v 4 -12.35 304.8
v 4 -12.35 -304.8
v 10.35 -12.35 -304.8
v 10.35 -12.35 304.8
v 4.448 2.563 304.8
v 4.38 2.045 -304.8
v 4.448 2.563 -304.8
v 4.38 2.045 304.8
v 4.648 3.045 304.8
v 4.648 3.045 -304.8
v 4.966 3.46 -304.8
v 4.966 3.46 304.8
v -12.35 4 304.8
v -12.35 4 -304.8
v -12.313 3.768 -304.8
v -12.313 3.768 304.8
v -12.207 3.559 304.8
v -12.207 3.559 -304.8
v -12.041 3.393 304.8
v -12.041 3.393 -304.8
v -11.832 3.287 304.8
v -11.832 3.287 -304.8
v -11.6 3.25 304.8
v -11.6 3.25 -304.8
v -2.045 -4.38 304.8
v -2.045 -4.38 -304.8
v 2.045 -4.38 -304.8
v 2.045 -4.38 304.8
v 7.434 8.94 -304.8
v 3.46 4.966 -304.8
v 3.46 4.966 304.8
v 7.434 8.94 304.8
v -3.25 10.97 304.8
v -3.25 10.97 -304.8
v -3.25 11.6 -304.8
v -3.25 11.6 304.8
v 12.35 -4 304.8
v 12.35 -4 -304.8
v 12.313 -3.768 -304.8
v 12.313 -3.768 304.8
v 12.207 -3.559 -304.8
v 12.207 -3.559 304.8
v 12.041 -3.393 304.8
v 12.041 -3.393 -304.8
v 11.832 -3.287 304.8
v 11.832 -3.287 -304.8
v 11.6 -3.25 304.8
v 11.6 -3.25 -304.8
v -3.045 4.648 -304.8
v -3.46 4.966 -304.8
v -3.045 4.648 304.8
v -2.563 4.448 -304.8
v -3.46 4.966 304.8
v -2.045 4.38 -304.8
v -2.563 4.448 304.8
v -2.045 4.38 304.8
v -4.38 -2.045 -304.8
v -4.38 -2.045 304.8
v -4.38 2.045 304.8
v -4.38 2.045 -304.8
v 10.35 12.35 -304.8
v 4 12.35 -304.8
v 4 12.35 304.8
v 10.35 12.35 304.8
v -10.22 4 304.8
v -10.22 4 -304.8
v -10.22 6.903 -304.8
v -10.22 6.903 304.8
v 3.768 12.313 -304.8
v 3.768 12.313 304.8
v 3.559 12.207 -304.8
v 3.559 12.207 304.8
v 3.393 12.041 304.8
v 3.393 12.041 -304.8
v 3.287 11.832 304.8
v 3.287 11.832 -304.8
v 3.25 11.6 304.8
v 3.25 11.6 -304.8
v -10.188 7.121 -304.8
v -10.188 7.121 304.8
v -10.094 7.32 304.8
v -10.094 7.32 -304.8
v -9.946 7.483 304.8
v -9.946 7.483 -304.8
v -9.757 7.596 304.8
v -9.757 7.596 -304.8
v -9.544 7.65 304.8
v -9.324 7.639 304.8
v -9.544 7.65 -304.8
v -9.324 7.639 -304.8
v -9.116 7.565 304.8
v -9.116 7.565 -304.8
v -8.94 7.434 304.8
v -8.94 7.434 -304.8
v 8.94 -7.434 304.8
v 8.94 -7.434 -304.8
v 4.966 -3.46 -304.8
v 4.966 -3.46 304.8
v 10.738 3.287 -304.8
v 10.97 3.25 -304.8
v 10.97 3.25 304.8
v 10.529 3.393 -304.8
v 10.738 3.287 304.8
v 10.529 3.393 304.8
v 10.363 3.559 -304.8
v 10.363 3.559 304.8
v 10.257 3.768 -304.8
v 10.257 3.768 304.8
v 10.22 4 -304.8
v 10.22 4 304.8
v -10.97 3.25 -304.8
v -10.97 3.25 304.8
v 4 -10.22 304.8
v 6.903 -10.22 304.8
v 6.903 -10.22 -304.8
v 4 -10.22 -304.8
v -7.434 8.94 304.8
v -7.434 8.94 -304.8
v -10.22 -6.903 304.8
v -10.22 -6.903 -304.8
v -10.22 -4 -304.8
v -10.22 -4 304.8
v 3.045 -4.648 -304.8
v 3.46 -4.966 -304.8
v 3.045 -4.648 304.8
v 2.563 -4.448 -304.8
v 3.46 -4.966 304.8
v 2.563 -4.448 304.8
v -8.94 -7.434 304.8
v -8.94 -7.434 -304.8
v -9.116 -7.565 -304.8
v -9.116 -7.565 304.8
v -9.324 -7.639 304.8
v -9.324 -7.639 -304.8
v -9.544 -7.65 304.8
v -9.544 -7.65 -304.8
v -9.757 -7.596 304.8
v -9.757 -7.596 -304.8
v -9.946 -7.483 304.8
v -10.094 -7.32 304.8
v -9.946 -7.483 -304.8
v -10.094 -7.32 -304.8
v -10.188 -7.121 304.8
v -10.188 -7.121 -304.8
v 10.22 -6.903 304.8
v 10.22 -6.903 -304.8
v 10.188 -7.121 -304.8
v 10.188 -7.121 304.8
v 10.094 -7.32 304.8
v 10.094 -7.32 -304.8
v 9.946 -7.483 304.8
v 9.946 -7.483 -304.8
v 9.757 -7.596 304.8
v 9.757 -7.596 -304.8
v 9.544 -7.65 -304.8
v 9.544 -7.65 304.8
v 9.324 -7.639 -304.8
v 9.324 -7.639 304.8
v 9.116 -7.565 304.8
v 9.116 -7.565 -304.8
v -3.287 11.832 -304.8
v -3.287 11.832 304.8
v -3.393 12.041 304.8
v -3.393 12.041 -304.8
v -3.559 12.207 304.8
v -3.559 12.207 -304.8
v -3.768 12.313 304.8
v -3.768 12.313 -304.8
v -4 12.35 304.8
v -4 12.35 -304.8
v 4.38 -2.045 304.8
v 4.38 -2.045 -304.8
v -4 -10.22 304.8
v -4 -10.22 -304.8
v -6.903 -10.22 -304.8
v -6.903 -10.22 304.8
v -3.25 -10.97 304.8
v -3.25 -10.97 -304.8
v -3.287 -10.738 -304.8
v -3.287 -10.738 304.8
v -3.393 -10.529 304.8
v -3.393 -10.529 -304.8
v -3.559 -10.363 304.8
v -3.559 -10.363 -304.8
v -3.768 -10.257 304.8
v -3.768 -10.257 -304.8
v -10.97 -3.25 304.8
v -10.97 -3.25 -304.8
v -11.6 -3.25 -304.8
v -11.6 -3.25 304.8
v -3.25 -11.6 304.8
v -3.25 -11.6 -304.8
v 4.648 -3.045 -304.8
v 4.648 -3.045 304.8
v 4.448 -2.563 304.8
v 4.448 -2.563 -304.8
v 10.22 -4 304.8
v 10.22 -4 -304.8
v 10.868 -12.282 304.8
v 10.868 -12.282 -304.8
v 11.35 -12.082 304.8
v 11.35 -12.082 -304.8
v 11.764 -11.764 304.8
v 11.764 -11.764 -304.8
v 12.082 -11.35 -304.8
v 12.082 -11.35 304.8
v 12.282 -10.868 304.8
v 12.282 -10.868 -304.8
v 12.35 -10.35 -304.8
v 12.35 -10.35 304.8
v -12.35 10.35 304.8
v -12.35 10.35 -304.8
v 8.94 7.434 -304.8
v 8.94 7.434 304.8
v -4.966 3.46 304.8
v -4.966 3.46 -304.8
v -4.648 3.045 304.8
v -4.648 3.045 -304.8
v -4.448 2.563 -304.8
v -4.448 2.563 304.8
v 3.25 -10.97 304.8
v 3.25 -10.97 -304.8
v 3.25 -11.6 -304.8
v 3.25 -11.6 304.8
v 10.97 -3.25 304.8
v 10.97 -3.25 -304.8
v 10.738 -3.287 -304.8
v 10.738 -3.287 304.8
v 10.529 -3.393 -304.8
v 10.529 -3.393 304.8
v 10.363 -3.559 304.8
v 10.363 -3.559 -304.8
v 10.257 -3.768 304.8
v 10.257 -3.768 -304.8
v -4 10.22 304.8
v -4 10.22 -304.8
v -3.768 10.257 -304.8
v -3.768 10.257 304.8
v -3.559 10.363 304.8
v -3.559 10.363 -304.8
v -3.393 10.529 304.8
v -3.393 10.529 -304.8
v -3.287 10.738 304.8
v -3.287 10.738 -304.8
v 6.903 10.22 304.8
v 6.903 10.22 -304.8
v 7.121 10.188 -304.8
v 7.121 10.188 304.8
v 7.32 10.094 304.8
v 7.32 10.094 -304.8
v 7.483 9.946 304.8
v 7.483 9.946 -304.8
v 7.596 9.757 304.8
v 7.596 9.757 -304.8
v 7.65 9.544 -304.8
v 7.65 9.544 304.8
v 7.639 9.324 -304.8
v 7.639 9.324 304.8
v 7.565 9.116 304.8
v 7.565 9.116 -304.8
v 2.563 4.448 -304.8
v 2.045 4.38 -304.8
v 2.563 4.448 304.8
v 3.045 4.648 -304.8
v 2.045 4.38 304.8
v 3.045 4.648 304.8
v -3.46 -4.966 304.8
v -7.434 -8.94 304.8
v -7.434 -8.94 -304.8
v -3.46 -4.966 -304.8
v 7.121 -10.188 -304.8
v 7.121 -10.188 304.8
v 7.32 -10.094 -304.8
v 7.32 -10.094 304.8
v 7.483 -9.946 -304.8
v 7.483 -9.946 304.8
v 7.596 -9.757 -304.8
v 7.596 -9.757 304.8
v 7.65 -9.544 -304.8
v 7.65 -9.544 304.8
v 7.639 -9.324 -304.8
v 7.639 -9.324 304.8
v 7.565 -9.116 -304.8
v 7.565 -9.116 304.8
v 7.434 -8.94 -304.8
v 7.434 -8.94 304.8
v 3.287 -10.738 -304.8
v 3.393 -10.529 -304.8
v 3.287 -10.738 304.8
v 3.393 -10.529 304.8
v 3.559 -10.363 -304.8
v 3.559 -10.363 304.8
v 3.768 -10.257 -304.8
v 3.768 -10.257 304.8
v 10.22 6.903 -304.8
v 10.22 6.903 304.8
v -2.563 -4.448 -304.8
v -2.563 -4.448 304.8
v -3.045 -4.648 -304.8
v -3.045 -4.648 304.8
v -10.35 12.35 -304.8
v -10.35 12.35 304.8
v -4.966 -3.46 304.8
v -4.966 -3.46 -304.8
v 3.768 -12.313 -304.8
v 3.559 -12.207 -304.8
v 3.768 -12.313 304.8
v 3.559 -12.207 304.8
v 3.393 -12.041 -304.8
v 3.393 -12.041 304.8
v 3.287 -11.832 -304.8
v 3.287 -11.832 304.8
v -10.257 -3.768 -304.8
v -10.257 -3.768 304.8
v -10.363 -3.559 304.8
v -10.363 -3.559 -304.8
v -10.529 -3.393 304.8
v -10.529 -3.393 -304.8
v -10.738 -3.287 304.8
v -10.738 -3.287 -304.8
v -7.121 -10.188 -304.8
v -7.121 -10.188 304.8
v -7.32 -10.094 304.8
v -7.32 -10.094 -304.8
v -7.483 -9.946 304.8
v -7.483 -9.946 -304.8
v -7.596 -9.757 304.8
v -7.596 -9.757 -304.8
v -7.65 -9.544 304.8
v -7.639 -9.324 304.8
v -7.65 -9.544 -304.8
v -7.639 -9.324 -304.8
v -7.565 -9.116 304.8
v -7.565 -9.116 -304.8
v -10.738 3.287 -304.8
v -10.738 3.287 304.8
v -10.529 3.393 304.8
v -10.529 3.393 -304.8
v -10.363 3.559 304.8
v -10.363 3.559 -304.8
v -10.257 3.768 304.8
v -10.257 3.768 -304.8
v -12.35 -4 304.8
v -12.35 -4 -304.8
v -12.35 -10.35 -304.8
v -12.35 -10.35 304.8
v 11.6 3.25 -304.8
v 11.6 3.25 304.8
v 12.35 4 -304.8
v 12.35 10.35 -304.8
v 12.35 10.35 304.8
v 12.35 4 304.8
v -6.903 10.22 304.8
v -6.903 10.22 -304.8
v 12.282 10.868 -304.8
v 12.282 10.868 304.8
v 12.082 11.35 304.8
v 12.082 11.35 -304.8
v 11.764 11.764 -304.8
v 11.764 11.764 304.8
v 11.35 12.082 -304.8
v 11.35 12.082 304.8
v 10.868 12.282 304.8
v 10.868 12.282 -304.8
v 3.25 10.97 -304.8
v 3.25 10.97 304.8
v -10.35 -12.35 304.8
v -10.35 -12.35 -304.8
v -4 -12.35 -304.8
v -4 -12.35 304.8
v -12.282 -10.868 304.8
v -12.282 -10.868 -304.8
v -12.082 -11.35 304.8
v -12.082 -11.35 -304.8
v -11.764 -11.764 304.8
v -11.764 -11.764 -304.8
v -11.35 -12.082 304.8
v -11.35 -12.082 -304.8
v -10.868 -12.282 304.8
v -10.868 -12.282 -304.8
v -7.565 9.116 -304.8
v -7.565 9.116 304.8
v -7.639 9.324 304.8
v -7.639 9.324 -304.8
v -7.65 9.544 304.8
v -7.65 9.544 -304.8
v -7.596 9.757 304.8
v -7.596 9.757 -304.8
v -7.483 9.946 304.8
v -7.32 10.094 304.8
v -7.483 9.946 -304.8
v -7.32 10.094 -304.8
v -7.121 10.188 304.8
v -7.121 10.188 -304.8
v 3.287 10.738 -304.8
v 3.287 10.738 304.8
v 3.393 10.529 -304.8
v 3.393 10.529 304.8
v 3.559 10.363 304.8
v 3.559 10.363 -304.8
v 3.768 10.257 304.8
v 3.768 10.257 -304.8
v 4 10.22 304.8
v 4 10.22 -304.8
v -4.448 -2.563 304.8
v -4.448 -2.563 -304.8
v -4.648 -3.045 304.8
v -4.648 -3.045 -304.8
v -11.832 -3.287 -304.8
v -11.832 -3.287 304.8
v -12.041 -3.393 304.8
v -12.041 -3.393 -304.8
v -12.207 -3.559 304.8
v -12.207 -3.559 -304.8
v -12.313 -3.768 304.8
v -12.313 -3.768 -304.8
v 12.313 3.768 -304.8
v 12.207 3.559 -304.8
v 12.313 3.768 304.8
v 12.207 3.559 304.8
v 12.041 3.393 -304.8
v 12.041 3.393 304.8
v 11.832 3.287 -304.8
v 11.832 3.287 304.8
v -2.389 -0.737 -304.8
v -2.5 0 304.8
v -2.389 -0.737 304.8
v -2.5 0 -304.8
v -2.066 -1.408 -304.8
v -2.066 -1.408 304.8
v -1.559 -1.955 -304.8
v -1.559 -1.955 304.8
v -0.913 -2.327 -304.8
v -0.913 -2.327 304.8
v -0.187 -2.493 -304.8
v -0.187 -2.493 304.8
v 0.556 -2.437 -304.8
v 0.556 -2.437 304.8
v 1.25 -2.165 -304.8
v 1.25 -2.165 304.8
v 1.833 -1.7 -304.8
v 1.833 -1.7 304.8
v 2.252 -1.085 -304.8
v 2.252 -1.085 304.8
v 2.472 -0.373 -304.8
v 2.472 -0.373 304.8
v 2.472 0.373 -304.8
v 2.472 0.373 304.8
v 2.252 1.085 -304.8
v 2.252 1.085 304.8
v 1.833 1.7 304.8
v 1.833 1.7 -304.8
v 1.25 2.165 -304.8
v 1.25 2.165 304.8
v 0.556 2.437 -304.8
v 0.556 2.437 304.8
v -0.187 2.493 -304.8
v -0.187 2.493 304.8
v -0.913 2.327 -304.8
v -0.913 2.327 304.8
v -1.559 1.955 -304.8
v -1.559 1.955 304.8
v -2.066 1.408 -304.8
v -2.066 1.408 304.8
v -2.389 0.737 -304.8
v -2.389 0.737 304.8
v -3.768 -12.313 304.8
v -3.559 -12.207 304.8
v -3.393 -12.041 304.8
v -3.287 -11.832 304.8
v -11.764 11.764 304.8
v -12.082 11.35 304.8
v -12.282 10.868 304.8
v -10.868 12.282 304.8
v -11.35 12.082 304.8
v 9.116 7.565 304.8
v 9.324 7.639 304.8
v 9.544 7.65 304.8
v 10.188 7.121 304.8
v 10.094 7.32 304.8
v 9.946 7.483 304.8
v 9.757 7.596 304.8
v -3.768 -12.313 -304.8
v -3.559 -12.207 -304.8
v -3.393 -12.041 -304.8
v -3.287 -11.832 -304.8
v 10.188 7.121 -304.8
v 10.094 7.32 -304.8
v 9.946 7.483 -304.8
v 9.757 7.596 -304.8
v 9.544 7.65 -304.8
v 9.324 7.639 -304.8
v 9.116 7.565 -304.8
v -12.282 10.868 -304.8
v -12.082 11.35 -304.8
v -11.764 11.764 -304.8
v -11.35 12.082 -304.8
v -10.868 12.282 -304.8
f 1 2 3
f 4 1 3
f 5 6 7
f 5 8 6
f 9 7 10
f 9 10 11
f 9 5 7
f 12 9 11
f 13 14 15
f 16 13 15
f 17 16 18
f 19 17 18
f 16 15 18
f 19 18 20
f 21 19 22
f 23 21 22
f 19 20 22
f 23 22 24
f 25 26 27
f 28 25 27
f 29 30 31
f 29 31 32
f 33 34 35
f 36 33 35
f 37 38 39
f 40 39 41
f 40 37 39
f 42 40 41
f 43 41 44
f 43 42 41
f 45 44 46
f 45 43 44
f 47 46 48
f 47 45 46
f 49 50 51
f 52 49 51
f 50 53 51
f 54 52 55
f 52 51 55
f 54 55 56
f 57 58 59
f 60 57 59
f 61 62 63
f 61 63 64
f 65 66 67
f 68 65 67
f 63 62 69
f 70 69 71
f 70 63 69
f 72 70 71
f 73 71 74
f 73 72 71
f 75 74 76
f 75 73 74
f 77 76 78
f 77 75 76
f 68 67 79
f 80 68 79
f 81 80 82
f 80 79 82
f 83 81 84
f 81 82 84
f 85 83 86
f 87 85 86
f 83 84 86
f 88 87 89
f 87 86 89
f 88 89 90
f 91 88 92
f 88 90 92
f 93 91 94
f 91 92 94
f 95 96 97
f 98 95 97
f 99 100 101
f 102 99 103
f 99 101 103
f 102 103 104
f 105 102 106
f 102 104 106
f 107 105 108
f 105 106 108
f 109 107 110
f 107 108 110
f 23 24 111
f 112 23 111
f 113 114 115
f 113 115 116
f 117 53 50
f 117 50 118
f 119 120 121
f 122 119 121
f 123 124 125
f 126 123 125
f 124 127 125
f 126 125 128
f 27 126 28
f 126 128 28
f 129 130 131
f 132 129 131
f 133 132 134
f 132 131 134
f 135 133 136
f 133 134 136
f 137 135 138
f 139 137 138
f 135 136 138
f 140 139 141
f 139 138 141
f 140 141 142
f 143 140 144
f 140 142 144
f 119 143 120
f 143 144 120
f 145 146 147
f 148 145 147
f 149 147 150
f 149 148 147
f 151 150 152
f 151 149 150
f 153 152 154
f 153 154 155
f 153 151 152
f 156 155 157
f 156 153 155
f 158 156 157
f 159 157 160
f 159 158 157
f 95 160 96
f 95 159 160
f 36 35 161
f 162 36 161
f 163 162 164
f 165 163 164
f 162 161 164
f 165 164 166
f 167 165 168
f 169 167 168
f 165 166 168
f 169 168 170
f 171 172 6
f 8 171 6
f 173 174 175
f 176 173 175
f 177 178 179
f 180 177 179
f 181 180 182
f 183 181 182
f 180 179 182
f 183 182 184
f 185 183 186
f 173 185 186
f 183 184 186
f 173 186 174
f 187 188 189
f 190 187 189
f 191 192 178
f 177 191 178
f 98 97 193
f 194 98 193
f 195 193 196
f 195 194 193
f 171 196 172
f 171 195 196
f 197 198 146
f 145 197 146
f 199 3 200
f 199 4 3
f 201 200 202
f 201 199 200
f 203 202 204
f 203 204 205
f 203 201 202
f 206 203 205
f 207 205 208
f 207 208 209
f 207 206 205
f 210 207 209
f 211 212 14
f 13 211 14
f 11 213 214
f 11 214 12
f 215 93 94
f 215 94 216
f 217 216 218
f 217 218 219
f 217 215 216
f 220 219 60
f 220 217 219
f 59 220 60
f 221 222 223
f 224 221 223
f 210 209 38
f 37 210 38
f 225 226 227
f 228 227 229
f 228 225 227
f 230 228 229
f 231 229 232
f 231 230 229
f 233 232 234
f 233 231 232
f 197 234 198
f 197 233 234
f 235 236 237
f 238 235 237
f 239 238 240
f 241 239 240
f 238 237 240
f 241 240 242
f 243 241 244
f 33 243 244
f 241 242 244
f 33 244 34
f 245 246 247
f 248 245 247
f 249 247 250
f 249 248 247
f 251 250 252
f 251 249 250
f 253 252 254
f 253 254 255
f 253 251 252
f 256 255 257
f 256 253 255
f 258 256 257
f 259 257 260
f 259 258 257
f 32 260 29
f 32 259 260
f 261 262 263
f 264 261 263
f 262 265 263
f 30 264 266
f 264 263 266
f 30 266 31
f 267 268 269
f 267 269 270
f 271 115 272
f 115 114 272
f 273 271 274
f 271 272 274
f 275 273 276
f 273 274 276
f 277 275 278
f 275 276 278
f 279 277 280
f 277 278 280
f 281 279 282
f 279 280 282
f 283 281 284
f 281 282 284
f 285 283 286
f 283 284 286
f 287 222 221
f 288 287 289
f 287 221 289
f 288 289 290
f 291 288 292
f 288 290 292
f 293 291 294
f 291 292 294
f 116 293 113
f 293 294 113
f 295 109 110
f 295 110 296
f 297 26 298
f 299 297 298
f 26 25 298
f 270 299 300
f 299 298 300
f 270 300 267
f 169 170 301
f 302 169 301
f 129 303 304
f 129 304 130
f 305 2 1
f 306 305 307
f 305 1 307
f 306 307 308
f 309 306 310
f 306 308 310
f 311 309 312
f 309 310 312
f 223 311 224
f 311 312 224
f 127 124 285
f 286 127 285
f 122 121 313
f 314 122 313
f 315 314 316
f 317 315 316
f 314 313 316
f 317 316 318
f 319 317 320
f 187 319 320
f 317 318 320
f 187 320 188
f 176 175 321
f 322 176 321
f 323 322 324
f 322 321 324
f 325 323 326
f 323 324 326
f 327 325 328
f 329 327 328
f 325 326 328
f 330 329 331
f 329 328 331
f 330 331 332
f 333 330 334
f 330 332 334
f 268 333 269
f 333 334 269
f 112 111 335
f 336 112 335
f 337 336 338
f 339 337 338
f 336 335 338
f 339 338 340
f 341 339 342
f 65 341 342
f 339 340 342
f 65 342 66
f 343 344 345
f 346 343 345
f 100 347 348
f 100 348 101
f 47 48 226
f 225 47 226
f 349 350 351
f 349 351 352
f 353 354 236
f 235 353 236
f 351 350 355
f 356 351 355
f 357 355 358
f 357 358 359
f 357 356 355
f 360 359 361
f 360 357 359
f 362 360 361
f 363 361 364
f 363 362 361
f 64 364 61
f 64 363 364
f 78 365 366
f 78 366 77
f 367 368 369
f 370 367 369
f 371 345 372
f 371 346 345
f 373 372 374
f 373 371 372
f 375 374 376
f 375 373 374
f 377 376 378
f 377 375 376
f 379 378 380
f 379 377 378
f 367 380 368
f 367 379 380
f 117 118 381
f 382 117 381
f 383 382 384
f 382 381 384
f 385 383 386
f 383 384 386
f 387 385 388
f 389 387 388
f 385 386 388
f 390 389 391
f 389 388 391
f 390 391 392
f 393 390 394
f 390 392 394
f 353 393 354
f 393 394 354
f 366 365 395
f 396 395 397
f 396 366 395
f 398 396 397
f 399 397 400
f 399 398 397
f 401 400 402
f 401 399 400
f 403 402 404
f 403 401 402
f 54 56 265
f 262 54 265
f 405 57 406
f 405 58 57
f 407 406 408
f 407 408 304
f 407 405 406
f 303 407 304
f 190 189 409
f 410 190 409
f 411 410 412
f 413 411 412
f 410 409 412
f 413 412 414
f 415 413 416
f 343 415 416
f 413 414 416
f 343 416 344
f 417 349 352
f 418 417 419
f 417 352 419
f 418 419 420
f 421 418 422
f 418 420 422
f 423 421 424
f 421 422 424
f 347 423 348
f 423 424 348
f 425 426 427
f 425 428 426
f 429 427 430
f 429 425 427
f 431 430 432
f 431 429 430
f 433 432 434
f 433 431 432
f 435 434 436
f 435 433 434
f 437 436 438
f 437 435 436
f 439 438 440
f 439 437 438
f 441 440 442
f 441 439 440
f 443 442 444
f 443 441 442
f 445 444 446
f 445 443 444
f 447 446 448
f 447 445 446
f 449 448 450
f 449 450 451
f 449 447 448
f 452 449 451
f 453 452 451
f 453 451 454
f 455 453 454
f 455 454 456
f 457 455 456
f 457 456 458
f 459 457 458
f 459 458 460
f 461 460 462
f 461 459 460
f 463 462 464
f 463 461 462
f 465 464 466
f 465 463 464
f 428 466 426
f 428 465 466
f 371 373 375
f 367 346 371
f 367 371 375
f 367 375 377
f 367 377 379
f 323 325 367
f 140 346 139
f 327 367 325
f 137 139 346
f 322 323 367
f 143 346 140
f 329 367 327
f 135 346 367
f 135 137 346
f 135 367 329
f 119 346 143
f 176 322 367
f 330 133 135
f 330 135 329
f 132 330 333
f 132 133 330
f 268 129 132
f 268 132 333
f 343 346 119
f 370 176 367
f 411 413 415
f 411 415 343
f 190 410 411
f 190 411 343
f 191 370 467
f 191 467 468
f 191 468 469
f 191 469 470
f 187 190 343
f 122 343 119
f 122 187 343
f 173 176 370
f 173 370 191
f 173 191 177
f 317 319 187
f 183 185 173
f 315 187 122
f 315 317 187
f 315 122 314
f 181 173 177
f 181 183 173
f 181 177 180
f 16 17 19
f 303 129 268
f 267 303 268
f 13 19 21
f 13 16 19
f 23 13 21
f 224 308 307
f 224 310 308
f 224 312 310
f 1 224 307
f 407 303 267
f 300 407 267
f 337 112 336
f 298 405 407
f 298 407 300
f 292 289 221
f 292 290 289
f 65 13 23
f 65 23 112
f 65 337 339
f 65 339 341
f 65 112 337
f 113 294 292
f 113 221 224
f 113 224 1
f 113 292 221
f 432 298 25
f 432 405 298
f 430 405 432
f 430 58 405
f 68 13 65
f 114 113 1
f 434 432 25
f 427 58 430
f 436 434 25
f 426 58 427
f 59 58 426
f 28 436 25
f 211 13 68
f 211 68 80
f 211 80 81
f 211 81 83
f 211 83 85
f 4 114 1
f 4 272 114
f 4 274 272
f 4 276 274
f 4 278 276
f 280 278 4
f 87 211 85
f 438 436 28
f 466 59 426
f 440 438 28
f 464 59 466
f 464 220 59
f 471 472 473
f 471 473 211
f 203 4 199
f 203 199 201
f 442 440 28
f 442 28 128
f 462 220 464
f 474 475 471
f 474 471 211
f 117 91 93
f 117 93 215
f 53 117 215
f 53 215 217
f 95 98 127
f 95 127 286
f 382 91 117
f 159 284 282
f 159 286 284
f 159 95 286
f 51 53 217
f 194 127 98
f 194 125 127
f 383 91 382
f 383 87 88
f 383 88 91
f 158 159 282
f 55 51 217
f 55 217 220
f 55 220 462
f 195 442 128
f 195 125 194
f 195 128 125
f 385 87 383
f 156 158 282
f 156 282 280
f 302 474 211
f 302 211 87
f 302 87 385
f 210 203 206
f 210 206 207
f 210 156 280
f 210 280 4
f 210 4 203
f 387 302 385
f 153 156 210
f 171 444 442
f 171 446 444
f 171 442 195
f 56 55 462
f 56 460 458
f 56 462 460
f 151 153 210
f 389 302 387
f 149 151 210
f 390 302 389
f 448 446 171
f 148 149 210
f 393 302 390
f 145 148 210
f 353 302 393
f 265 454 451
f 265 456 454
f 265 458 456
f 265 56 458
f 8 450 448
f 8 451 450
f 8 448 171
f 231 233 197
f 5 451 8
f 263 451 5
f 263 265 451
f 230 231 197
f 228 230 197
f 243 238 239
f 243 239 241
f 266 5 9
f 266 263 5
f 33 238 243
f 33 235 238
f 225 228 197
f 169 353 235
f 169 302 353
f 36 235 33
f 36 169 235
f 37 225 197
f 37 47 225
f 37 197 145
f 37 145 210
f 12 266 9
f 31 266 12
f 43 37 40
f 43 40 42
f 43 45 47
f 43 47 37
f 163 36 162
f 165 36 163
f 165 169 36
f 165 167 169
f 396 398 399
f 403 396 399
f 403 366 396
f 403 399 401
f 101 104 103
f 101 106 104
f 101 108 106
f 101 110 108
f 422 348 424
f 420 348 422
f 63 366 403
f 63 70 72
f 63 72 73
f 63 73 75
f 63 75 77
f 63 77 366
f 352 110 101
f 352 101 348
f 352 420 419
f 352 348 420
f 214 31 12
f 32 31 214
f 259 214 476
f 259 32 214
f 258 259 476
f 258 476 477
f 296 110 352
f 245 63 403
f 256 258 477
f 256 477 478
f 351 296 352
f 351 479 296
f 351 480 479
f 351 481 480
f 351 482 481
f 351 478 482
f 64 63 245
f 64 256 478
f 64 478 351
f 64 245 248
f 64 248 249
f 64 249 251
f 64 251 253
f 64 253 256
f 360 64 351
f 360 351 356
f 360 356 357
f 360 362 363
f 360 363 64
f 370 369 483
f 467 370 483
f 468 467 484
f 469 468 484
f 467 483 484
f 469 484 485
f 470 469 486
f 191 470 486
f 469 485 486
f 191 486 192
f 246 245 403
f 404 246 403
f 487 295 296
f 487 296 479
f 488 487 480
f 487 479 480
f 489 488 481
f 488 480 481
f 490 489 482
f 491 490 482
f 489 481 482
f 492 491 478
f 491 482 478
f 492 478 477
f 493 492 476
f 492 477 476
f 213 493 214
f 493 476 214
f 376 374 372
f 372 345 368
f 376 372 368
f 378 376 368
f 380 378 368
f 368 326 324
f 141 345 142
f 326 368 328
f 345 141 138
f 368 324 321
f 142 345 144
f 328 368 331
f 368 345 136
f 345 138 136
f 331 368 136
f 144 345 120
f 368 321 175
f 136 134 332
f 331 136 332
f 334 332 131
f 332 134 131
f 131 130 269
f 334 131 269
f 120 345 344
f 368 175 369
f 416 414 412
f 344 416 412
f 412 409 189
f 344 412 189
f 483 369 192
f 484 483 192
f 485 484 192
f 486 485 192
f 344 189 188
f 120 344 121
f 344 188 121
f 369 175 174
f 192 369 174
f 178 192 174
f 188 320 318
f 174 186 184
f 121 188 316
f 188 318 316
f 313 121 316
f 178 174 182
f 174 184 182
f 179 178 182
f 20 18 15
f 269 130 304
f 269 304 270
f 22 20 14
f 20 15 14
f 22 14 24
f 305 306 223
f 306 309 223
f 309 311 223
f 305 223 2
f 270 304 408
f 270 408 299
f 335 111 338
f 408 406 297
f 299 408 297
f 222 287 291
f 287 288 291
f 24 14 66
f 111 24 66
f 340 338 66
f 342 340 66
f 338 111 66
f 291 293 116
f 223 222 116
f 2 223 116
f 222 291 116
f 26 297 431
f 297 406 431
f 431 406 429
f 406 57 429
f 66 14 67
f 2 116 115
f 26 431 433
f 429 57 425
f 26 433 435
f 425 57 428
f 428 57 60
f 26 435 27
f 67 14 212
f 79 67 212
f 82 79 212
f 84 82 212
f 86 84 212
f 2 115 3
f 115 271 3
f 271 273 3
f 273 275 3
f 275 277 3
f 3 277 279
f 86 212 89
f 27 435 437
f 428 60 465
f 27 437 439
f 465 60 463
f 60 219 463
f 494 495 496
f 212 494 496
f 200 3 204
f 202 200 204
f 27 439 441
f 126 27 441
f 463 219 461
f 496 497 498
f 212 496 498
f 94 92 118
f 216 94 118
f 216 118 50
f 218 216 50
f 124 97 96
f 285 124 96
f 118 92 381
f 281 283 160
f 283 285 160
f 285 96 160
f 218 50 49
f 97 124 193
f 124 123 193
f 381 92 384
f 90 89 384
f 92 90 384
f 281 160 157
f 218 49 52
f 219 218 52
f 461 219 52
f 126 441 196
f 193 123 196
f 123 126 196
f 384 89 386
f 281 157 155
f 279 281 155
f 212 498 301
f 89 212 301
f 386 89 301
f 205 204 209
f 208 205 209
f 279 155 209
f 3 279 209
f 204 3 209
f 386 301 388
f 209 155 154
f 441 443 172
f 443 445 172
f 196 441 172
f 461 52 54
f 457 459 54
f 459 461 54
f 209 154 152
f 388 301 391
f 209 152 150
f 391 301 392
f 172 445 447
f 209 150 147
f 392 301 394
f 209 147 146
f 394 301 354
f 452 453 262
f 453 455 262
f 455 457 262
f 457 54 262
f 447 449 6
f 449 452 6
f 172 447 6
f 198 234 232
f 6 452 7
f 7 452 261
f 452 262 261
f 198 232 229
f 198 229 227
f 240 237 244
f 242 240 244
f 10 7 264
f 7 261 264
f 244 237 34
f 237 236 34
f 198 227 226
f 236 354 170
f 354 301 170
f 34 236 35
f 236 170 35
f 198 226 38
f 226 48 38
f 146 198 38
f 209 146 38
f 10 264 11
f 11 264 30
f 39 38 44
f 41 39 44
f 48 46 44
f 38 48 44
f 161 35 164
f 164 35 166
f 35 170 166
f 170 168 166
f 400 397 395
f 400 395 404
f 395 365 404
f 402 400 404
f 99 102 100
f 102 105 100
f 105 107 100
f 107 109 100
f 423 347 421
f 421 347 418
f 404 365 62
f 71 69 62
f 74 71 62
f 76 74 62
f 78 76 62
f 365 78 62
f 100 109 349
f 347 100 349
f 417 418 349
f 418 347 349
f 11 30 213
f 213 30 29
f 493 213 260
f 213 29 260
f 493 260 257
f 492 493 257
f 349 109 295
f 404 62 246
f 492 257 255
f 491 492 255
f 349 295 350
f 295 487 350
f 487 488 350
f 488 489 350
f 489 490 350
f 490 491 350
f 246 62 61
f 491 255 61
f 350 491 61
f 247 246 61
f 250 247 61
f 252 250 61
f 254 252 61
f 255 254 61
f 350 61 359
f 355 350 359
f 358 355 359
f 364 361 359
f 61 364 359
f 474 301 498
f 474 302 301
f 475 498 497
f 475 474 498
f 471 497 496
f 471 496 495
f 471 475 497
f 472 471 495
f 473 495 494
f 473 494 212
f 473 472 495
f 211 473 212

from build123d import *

# Parameters (mm, degrees)
SKETCH2_W            = 8.76
SKETCH2_H            = 8.76
SKETCH2_R            = 2.5
BOSS_EXTRUDE1_DEPTH  = 304.8
BOSS_EXTRUDE2_START  = -304.8
BOSS_EXTRUDE2_DEPTH  = 609.6
FILLET1_R            = 0.75
FILLET1_OF_MIRROR1_R = 0.75
MIRROR2_START        = -304.8
MIRROR2_DEPTH        = 609.6
FILLET2_R            = 2


# Read off the part's stored shape, not the designer's step: Mirror2
with BuildPart() as part:
    # Sketch2 → Boss-Extrude1 (new, symmetric)
    with BuildSketch(Plane.XY):
        Rectangle(SKETCH2_W, SKETCH2_H)
        with Locations(Location((0, 0, 0), (0, 0, 180))):
            Circle(SKETCH2_R, mode=Mode.SUBTRACT)
    extrude(amount=BOSS_EXTRUDE1_DEPTH, both=True)

    # Sketch3 → Boss-Extrude2 (add)
    with BuildSketch(Plane.XY.offset(BOSS_EXTRUDE2_START)):
        Polygon((3.25, 12.35), (12.35, 12.35), (12.35, 3.25), (10.22, 3.25), (10.22, 8.713862556), (4.38, 2.873862556), (4.38, 4.38), (2.873862556, 4.38), (8.713862556, 10.22), (3.25, 10.22), align=None)
    boss_extrude2 = extrude(amount=BOSS_EXTRUDE2_DEPTH)

    # Fillet1
    fillet1_edges = [part.edges().sort_by_distance(p)[0] for p in [
        (3.25, 12.35, 0),
        (3.25, 10.22, 0),
        (8.713862556, 10.22, 0),
        (10.22, 8.713862556, 0),
        (10.22, 3.25, 0),
        (12.35, 3.25, 0),
    ]]
    fillet(fillet1_edges, radius=FILLET1_R)

    # Mirror1: Boss-Extrude2 across plane
    add(boss_extrude2.mirror(Plane.ZX))

    # Fillet1 of Mirror1
    fillet1_of_mirror1_edges = [part.edges().sort_by_distance(p)[0] for p in [
        (3.25, -12.35, 0),
        (3.25, -10.22, 0),
        (8.713862556, -10.22, 0),
        (10.22, -8.713862556, 0),
        (10.22, -3.25, 0),
        (12.35, -3.25, 0),
    ]]
    fillet(fillet1_of_mirror1_edges, radius=FILLET1_OF_MIRROR1_R)

    # Mirror2 outline → Mirror2 (add)
    with BuildSketch(Plane.XY.offset(MIRROR2_START)):
        with BuildLine():
            ThreePointArc((-7.43353247, 8.939669914), (-7.596112034, 9.757012574), (-6.903202384, 10.22))
            Line((-6.903202384, 10.22), (-4, 10.22))
            ThreePointArc((-4, 10.22), (-3.469669914, 10.439669914), (-3.25, 10.97))
            Line((-3.25, 10.97), (-3.25, 11.6))
            ThreePointArc((-3.25, 11.6), (-3.469669914, 12.130330086), (-4, 12.35))
            Line((-4, 12.35), (-12.35, 12.35))
            Line((-12.35, 12.35), (-12.35, 4))
            ThreePointArc((-12.35, 4), (-12.130330086, 3.469669914), (-11.6, 3.25))
            Line((-11.6, 3.25), (-10.97, 3.25))
            ThreePointArc((-10.97, 3.25), (-10.439669914, 3.469669914), (-10.22, 4))
            Line((-10.22, 4), (-10.22, 6.903202384))
            ThreePointArc((-10.22, 6.903202384), (-9.757012574, 7.596112034), (-8.939669914, 7.43353247))
            Line((-8.939669914, 7.43353247), (-4.38, 2.873862556))
            Line((-4.38, 2.873862556), (-4.38, 4.38))
            Line((-4.38, 4.38), (-2.873862556, 4.38))
            Line((-2.873862556, 4.38), (-7.43353247, 8.939669914))
        make_face()
        with BuildLine():
            Line((-4.38, -4.38), (-4.38, -2.873862556))
            Line((-4.38, -2.873862556), (-8.939669914, -7.43353247))
            ThreePointArc((-8.939669914, -7.43353247), (-9.757012574, -7.596112034), (-10.22, -6.903202384))
            Line((-10.22, -6.903202384), (-10.22, -4))
            ThreePointArc((-10.22, -4), (-10.439669914, -3.469669914), (-10.97, -3.25))
            Line((-10.97, -3.25), (-11.6, -3.25))
            ThreePointArc((-11.6, -3.25), (-12.130330086, -3.469669914), (-12.35, -4))
            Line((-12.35, -4), (-12.35, -12.35))
            Line((-12.35, -12.35), (-4, -12.35))
            ThreePointArc((-4, -12.35), (-3.469669914, -12.130330086), (-3.25, -11.6))
            Line((-3.25, -11.6), (-3.25, -10.97))
            ThreePointArc((-3.25, -10.97), (-3.469669914, -10.439669914), (-4, -10.22))
            Line((-4, -10.22), (-6.903202384, -10.22))
            ThreePointArc((-6.903202384, -10.22), (-7.596112034, -9.757012574), (-7.43353247, -8.939669914))
            Line((-7.43353247, -8.939669914), (-2.873862556, -4.38))
            Line((-2.873862556, -4.38), (-4.38, -4.38))
        make_face()
    extrude(amount=MIRROR2_DEPTH)

    # Fillet2
    fillet2_edges = [part.edges().sort_by_distance(p)[0] for p in [
        (-2.873862556, -4.38, 0),
        (-4.38, -2.873862556, 0),
        (-12.35, -12.35, 0),
        (2.873862556, 4.38, 0),
        (4.38, 2.873862556, 0),
        (12.35, 12.35, 0),
        (-2.873862556, 4.38, 0),
        (-4.38, 2.873862556, 0),
        (-12.35, 12.35, 0),
        (2.873862556, -4.38, 0),
        (4.38, -2.873862556, 0),
        (12.35, -12.35, 0),
    ]]
    fillet(fillet2_edges, radius=FILLET2_R)


solid = part.part
